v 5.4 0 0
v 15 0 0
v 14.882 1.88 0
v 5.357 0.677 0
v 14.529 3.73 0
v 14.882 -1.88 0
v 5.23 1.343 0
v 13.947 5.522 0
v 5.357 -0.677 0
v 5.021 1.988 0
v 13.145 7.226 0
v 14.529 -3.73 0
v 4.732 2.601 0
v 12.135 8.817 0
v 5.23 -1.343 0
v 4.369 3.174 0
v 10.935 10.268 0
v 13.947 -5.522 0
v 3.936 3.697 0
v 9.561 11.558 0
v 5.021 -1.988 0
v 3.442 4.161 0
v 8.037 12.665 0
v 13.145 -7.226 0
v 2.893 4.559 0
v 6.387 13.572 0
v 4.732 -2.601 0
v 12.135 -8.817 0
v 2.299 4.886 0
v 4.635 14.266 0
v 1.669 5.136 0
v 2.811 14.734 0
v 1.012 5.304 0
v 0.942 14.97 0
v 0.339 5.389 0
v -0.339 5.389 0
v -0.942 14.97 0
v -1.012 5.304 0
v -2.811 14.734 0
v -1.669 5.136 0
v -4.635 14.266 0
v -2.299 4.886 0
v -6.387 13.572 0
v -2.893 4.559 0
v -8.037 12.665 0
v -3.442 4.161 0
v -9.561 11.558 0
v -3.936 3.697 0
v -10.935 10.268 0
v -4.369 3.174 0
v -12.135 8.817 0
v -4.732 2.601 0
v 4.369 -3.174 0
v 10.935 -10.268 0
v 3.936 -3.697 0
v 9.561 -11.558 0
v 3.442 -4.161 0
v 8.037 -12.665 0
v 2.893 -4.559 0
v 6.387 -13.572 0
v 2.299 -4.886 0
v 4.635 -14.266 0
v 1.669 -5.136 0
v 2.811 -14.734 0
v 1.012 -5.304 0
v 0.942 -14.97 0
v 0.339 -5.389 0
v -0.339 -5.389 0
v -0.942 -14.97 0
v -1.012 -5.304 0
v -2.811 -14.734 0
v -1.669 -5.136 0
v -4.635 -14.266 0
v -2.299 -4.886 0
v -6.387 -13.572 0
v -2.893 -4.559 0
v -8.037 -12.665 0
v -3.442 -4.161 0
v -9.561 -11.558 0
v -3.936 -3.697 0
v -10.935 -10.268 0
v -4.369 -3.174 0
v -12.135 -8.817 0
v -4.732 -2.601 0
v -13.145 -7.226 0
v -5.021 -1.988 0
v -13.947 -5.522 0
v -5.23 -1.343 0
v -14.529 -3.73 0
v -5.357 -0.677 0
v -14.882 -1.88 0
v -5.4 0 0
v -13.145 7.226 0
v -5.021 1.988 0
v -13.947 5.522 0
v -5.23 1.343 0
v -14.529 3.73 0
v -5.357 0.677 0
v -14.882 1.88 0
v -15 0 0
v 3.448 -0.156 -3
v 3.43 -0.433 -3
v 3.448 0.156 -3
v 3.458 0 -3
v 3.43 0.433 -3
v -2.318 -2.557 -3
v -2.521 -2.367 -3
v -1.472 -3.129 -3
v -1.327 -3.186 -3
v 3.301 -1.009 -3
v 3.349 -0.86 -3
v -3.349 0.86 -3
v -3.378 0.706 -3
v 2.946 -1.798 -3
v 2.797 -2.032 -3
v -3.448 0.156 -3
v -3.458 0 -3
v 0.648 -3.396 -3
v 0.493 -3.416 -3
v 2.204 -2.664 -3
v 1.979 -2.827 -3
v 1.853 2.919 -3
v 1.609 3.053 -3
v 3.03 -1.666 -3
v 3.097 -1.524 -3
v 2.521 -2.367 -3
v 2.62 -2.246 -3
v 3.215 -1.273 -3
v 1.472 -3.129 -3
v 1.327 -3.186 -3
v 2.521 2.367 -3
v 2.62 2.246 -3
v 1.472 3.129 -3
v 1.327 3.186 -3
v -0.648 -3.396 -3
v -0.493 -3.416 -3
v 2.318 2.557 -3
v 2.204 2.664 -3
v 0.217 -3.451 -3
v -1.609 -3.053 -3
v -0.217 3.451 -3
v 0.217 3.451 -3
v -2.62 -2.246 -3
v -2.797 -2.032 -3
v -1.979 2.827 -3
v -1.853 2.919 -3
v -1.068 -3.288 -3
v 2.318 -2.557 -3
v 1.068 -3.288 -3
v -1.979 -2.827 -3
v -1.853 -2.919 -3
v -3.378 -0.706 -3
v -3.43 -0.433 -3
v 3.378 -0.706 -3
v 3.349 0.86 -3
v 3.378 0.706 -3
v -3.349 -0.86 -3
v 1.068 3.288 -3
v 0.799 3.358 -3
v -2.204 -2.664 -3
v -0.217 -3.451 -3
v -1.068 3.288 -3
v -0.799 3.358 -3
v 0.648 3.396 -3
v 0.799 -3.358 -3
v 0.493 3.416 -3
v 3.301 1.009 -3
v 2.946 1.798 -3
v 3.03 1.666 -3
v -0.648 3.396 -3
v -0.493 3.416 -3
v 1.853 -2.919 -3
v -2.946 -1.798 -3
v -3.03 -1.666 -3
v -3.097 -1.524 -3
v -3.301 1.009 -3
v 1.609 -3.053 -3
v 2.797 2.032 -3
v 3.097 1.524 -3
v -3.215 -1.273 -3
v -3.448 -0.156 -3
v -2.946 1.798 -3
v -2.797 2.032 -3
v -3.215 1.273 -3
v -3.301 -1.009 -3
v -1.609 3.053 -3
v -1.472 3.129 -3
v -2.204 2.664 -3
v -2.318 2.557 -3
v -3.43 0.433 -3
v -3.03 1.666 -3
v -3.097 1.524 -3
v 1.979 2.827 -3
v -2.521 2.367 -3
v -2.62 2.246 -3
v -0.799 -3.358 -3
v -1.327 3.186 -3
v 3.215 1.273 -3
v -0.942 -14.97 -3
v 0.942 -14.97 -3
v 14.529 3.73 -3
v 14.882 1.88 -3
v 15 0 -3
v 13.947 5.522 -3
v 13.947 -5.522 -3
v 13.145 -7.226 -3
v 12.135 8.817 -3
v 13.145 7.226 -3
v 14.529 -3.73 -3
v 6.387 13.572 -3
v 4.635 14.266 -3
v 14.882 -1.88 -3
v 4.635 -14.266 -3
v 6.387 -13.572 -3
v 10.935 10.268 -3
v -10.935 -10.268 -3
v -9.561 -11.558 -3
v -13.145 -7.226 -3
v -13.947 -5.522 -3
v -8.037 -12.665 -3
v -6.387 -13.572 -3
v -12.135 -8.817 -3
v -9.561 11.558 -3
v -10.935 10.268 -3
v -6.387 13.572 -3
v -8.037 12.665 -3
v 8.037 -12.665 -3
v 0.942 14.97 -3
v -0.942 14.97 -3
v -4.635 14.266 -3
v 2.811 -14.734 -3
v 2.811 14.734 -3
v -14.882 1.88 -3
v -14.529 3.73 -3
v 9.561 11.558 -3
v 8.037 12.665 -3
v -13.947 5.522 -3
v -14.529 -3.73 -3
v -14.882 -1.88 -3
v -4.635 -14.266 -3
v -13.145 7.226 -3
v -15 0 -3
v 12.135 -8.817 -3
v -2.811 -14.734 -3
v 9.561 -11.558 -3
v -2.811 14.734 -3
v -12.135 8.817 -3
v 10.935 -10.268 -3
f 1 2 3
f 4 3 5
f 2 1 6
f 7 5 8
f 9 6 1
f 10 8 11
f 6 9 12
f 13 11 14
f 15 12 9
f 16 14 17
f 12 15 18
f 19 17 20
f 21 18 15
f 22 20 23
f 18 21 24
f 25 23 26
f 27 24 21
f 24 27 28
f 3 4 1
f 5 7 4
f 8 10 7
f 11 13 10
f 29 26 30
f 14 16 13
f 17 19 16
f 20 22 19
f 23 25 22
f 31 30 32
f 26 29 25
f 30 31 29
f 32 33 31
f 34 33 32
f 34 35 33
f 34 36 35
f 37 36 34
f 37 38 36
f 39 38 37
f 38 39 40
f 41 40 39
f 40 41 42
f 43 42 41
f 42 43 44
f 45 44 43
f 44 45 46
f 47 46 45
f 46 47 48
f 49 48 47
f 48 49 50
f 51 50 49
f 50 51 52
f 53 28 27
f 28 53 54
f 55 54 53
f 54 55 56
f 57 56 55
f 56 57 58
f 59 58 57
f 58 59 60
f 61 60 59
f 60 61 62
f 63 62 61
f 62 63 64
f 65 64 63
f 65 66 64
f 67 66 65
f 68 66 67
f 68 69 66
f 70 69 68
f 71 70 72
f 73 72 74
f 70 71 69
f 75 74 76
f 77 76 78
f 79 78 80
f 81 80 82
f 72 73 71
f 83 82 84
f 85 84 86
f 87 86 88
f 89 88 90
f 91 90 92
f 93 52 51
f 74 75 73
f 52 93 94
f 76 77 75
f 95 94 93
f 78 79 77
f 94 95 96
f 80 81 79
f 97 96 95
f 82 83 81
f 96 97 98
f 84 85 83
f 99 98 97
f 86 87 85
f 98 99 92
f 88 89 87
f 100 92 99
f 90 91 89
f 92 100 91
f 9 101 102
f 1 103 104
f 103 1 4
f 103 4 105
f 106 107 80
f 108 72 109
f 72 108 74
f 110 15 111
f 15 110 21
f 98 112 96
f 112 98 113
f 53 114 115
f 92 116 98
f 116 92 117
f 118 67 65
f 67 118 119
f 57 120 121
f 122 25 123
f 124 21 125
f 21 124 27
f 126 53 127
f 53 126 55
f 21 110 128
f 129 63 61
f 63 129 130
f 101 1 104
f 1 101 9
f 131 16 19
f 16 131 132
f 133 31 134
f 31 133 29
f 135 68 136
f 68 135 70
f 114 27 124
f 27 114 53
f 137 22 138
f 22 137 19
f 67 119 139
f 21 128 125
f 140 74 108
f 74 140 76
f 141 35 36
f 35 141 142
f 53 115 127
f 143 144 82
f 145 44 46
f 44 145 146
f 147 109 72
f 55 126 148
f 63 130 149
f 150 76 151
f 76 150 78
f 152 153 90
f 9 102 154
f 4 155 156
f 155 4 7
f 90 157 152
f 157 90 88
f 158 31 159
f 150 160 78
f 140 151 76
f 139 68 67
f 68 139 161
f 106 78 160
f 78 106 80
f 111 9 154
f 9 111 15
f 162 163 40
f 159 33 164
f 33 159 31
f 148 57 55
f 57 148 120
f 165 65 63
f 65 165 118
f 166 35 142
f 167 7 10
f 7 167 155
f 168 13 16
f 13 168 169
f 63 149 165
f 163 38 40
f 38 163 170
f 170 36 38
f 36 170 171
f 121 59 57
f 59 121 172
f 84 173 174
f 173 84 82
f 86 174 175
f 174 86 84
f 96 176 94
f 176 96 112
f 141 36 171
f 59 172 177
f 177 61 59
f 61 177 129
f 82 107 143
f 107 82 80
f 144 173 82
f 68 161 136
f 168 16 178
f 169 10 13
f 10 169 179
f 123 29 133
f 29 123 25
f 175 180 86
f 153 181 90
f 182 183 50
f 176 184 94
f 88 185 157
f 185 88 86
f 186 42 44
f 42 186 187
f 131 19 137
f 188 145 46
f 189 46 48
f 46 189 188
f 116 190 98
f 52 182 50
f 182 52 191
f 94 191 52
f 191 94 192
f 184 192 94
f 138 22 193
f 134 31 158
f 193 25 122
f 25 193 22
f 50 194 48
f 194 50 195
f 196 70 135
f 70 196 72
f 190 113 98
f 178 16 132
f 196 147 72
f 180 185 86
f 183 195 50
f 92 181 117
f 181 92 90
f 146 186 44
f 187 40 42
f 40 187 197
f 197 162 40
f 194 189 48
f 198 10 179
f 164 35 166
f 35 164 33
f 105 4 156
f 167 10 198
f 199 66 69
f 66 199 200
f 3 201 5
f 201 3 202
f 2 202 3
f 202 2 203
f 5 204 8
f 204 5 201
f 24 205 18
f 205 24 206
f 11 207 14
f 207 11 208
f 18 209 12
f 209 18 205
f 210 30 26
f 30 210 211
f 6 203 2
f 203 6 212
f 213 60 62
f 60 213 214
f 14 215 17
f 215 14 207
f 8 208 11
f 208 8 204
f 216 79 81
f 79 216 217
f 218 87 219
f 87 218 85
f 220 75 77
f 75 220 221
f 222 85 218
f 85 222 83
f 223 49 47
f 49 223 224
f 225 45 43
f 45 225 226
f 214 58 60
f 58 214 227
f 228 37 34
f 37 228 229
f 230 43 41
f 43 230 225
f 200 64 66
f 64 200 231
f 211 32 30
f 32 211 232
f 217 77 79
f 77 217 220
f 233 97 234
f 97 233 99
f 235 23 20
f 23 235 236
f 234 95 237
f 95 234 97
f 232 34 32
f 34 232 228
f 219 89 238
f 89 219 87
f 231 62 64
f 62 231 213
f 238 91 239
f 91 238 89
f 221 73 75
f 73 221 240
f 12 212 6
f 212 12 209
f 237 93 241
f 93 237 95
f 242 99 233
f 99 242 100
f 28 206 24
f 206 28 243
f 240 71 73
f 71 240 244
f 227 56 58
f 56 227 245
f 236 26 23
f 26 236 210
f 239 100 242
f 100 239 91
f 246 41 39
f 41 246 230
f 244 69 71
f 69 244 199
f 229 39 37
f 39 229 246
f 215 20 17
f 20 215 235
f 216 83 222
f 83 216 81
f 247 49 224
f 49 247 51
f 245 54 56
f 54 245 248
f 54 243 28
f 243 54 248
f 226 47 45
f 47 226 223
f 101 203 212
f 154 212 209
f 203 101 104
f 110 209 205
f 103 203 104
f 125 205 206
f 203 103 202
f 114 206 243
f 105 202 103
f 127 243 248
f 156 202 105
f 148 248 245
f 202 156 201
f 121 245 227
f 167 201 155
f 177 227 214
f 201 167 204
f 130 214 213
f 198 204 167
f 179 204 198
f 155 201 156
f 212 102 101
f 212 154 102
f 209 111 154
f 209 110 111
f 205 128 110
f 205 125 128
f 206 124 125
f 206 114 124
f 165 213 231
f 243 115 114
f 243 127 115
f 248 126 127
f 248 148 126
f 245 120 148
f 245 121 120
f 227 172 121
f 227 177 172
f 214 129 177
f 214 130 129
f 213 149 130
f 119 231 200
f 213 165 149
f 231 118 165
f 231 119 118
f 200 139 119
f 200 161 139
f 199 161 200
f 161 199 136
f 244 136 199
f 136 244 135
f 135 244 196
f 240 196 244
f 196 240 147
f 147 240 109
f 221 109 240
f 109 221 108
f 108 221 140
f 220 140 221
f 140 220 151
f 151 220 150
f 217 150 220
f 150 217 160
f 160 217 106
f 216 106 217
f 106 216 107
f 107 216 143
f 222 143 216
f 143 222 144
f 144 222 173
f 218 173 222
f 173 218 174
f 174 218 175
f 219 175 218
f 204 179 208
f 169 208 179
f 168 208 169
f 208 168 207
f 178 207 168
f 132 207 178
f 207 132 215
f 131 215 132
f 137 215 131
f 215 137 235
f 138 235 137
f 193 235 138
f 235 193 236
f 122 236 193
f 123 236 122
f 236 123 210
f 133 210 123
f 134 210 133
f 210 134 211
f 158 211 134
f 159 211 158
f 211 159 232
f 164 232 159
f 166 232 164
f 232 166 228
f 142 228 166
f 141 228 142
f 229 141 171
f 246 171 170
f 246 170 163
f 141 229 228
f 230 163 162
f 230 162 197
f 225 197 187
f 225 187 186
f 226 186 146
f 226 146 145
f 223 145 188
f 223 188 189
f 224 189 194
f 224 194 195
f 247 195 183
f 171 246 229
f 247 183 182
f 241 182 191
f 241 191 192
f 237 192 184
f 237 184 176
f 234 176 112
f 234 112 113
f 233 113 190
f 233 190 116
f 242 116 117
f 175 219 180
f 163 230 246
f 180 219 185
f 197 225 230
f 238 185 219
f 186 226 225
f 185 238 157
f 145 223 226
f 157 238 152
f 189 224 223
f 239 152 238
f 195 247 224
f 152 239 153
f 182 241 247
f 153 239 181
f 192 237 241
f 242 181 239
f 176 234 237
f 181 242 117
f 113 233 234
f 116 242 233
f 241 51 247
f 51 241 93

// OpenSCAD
$fn = 50;


difference() {
	union() {
		translate(v = [0, 0, -3.0000000000]) {
			cylinder(h = 3, r = 15.0000000000);
		}
	}
	union() {
		translate(v = [0, 0, 0]) {
			rotate(a = [0, 0, 0]) {
				difference() {
					union() {
						translate(v = [0, 0, -6.0000000000]) {
							cylinder(h = 6, r = 2.6000000000);
						}
						translate(v = [0, 0, -3.9000000000]) {
							cylinder(h = 3.9000000000, r1 = 2.8750000000, r2 = 5.4000000000);
						}
						translate(v = [0, 0, -6.0000000000]) {
							cylinder(h = 6, r = 2.8750000000);
						}
						translate(v = [0, 0, -6.0000000000]) {
							cylinder(h = 6, r = 2.6000000000);
						}
					}
					union();
				}
			}
		}
	}
}
